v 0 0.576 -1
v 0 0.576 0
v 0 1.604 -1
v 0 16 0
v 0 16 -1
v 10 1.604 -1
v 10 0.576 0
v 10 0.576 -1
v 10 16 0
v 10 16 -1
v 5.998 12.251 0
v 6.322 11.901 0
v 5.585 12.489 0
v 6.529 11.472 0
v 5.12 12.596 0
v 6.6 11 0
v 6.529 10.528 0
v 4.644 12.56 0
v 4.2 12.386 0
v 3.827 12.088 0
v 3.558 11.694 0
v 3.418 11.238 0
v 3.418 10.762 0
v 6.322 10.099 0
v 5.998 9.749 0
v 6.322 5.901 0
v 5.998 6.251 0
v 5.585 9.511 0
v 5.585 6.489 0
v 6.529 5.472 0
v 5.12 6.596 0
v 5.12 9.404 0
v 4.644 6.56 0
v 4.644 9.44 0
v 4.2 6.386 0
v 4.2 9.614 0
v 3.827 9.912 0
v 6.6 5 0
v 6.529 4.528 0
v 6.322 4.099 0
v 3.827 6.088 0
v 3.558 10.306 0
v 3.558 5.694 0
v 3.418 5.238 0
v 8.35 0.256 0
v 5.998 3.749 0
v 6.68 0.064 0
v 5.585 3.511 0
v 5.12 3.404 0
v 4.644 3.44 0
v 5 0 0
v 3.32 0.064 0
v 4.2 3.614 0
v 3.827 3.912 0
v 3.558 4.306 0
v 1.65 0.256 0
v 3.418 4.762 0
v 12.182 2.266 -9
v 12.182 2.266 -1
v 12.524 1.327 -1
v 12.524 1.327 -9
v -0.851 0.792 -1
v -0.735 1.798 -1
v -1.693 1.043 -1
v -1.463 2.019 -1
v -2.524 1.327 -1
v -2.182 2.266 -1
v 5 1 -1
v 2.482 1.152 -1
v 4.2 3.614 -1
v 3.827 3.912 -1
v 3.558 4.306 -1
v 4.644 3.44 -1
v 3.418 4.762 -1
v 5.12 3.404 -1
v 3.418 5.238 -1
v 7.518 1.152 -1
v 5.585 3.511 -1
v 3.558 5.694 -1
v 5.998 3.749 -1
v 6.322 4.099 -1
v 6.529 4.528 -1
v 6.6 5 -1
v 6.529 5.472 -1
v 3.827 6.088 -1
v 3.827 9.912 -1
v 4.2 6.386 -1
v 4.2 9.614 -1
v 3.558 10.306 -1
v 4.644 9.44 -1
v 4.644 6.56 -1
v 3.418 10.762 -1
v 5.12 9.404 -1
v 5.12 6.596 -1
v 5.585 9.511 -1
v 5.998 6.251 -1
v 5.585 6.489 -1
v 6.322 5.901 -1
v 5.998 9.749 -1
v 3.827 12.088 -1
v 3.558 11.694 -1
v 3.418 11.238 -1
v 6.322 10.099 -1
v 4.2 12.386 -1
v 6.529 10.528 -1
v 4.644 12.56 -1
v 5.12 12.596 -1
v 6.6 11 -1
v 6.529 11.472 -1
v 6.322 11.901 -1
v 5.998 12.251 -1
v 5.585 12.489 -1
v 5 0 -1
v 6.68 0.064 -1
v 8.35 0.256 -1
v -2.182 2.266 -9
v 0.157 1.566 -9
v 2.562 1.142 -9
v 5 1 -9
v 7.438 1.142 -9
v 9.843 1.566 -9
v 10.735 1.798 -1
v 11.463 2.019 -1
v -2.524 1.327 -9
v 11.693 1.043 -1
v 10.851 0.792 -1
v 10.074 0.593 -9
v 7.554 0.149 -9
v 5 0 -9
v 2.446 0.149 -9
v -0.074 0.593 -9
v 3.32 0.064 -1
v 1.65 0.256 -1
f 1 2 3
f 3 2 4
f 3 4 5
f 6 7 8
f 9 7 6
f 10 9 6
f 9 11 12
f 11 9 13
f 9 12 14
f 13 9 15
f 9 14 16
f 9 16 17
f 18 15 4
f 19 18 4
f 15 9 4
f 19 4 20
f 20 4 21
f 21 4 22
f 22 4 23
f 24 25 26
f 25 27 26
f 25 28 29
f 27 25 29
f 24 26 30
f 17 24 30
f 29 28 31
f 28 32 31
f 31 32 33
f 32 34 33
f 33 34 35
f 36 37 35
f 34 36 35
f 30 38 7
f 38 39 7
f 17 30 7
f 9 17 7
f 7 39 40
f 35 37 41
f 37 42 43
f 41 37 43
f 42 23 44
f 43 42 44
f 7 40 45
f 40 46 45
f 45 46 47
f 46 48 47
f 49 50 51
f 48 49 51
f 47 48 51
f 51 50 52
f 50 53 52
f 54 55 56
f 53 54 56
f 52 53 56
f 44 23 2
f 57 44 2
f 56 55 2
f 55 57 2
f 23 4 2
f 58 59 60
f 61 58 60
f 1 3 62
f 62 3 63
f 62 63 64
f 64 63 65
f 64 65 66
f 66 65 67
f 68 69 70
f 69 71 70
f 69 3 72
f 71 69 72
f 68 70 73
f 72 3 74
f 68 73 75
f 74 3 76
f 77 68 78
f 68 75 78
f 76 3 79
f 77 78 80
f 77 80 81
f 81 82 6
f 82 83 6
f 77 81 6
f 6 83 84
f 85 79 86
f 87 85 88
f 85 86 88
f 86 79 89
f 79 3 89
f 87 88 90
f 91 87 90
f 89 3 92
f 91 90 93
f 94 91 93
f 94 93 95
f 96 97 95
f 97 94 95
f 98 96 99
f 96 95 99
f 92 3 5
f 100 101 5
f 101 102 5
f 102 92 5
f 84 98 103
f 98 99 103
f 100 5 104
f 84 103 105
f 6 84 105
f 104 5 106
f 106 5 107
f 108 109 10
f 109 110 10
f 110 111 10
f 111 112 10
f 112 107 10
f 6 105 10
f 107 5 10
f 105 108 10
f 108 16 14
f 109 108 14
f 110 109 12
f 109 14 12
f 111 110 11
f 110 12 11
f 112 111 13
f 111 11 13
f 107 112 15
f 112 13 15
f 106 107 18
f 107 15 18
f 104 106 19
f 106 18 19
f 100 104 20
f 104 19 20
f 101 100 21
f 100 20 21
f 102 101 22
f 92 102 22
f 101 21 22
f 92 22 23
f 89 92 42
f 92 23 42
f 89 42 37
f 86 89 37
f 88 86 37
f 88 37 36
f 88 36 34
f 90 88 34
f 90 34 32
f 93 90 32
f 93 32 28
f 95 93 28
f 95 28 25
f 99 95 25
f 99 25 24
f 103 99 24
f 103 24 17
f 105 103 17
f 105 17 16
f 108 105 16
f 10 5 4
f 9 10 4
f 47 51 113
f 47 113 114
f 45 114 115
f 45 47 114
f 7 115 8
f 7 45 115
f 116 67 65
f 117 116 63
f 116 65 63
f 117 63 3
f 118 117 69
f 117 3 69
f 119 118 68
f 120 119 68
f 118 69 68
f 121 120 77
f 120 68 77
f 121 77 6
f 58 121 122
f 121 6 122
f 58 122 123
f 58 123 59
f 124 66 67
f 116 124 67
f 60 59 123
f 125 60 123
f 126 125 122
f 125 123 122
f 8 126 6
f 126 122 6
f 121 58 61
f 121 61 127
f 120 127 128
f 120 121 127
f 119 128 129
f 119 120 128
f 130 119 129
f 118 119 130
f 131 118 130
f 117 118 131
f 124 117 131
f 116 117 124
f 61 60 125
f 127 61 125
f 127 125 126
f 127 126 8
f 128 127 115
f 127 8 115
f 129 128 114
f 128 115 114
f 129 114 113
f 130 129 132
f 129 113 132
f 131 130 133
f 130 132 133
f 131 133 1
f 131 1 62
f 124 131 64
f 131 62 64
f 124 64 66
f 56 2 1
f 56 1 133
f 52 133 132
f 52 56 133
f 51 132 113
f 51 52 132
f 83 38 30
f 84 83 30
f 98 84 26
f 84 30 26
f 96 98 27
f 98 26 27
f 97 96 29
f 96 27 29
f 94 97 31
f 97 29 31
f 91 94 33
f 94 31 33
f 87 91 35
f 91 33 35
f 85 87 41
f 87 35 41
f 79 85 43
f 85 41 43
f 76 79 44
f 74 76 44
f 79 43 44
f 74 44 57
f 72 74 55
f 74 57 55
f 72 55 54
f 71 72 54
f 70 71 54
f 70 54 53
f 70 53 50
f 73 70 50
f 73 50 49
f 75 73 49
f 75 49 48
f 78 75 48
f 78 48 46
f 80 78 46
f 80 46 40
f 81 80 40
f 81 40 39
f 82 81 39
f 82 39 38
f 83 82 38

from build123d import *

# Parameters (mm, degrees)
EXTRUDE_1_DEPTH     = 10
SKETCH_2_R          = 1.6
CUT_EXTRUDE_1_DEPTH = 20.798989873
SKETCH_4_W          = 10
SKETCH_4_H          = 5
CUT_EXTRUDE_2_DEPTH = 20
EXTRUDE_2_DEPTH     = 8
CUT_EXTRUDE_START   = -1
CUT_EXTRUDE_3_DEPTH = 1


# Read off the part's stored shape, not the designer's step: 除料-伸長3
with BuildPart() as part:
    # 草圖1 → 填料-伸長1 (new body)
    with BuildSketch(Plane(origin=(0, 0, 0), x_dir=(0, 0, -1), z_dir=(1, 0, 0))):
        Polygon((0, 0), (6, 0), (6, 1), (1, 1), (1, 16), (0, 16), align=None)
    extrude(amount=EXTRUDE_1_DEPTH)

    # 草圖2 → 除料-伸長1 (cut, through all)
    with BuildSketch(Plane.XY):
        with Locations((5, 11)):
            Circle(SKETCH_2_R)
        with Locations((5, 5)):
            Circle(SKETCH_2_R)
    extrude(amount=-CUT_EXTRUDE_1_DEPTH, mode=Mode.SUBTRACT)

    # 草圖4 → 除料-伸長2 (cut, through all)
    with BuildSketch(Plane(origin=(0, 1, 0), x_dir=(1, 0, 0), z_dir=(0, 1, 0))):
        with Locations((5, 3.5)):
            Rectangle(SKETCH_4_W, SKETCH_4_H)
    extrude(amount=-CUT_EXTRUDE_2_DEPTH, mode=Mode.SUBTRACT)

    # 草圖5 → 填料-伸長2 (add)
    with BuildSketch(Plane(origin=(0, 0, -1), x_dir=(-1, 0, 0), z_dir=(0, 0, -1))):
        with BuildLine():
            Line((2.524443153, 1.326762343), (2.18242301, 2.266454963))
            ThreePointArc((2.18242301, 2.266454963), (-5, 1), (-12.18242301, 2.266454963))
            Line((-12.18242301, 2.266454963), (-12.524443153, 1.326762343))
            ThreePointArc((-12.524443153, 1.326762343), (-5, 0), (2.524443153, 1.326762343))
        make_face()
    extrude(amount=EXTRUDE_2_DEPTH)

    # 除料-伸長3 outline → 除料-伸長3 (cut)
    with BuildSketch(Plane(origin=(0, 0, -1), x_dir=(-1, 0, 0), z_dir=(0, 0, -1)).offset(CUT_EXTRUDE_START)):
        with BuildLine():
            Line((0, 0), (0, 0.575714714))
            ThreePointArc((0, 0.575714714), (-2.483482164, 0.144402594), (-4.999999936, 0))
            Line((-4.999999936, 0), (0, 0))
        make_face()
        with BuildLine():
            Line((-10, 0), (-4.999999936, 0))
            ThreePointArc((-4.999999936, 0), (-7.516517772, 0.144402587), (-10, 0.575714714))
            Line((-10, 0.575714714), (-10, 0))
        make_face()
    extrude(amount=CUT_EXTRUDE_3_DEPTH, mode=Mode.SUBTRACT)


solid = part.part
